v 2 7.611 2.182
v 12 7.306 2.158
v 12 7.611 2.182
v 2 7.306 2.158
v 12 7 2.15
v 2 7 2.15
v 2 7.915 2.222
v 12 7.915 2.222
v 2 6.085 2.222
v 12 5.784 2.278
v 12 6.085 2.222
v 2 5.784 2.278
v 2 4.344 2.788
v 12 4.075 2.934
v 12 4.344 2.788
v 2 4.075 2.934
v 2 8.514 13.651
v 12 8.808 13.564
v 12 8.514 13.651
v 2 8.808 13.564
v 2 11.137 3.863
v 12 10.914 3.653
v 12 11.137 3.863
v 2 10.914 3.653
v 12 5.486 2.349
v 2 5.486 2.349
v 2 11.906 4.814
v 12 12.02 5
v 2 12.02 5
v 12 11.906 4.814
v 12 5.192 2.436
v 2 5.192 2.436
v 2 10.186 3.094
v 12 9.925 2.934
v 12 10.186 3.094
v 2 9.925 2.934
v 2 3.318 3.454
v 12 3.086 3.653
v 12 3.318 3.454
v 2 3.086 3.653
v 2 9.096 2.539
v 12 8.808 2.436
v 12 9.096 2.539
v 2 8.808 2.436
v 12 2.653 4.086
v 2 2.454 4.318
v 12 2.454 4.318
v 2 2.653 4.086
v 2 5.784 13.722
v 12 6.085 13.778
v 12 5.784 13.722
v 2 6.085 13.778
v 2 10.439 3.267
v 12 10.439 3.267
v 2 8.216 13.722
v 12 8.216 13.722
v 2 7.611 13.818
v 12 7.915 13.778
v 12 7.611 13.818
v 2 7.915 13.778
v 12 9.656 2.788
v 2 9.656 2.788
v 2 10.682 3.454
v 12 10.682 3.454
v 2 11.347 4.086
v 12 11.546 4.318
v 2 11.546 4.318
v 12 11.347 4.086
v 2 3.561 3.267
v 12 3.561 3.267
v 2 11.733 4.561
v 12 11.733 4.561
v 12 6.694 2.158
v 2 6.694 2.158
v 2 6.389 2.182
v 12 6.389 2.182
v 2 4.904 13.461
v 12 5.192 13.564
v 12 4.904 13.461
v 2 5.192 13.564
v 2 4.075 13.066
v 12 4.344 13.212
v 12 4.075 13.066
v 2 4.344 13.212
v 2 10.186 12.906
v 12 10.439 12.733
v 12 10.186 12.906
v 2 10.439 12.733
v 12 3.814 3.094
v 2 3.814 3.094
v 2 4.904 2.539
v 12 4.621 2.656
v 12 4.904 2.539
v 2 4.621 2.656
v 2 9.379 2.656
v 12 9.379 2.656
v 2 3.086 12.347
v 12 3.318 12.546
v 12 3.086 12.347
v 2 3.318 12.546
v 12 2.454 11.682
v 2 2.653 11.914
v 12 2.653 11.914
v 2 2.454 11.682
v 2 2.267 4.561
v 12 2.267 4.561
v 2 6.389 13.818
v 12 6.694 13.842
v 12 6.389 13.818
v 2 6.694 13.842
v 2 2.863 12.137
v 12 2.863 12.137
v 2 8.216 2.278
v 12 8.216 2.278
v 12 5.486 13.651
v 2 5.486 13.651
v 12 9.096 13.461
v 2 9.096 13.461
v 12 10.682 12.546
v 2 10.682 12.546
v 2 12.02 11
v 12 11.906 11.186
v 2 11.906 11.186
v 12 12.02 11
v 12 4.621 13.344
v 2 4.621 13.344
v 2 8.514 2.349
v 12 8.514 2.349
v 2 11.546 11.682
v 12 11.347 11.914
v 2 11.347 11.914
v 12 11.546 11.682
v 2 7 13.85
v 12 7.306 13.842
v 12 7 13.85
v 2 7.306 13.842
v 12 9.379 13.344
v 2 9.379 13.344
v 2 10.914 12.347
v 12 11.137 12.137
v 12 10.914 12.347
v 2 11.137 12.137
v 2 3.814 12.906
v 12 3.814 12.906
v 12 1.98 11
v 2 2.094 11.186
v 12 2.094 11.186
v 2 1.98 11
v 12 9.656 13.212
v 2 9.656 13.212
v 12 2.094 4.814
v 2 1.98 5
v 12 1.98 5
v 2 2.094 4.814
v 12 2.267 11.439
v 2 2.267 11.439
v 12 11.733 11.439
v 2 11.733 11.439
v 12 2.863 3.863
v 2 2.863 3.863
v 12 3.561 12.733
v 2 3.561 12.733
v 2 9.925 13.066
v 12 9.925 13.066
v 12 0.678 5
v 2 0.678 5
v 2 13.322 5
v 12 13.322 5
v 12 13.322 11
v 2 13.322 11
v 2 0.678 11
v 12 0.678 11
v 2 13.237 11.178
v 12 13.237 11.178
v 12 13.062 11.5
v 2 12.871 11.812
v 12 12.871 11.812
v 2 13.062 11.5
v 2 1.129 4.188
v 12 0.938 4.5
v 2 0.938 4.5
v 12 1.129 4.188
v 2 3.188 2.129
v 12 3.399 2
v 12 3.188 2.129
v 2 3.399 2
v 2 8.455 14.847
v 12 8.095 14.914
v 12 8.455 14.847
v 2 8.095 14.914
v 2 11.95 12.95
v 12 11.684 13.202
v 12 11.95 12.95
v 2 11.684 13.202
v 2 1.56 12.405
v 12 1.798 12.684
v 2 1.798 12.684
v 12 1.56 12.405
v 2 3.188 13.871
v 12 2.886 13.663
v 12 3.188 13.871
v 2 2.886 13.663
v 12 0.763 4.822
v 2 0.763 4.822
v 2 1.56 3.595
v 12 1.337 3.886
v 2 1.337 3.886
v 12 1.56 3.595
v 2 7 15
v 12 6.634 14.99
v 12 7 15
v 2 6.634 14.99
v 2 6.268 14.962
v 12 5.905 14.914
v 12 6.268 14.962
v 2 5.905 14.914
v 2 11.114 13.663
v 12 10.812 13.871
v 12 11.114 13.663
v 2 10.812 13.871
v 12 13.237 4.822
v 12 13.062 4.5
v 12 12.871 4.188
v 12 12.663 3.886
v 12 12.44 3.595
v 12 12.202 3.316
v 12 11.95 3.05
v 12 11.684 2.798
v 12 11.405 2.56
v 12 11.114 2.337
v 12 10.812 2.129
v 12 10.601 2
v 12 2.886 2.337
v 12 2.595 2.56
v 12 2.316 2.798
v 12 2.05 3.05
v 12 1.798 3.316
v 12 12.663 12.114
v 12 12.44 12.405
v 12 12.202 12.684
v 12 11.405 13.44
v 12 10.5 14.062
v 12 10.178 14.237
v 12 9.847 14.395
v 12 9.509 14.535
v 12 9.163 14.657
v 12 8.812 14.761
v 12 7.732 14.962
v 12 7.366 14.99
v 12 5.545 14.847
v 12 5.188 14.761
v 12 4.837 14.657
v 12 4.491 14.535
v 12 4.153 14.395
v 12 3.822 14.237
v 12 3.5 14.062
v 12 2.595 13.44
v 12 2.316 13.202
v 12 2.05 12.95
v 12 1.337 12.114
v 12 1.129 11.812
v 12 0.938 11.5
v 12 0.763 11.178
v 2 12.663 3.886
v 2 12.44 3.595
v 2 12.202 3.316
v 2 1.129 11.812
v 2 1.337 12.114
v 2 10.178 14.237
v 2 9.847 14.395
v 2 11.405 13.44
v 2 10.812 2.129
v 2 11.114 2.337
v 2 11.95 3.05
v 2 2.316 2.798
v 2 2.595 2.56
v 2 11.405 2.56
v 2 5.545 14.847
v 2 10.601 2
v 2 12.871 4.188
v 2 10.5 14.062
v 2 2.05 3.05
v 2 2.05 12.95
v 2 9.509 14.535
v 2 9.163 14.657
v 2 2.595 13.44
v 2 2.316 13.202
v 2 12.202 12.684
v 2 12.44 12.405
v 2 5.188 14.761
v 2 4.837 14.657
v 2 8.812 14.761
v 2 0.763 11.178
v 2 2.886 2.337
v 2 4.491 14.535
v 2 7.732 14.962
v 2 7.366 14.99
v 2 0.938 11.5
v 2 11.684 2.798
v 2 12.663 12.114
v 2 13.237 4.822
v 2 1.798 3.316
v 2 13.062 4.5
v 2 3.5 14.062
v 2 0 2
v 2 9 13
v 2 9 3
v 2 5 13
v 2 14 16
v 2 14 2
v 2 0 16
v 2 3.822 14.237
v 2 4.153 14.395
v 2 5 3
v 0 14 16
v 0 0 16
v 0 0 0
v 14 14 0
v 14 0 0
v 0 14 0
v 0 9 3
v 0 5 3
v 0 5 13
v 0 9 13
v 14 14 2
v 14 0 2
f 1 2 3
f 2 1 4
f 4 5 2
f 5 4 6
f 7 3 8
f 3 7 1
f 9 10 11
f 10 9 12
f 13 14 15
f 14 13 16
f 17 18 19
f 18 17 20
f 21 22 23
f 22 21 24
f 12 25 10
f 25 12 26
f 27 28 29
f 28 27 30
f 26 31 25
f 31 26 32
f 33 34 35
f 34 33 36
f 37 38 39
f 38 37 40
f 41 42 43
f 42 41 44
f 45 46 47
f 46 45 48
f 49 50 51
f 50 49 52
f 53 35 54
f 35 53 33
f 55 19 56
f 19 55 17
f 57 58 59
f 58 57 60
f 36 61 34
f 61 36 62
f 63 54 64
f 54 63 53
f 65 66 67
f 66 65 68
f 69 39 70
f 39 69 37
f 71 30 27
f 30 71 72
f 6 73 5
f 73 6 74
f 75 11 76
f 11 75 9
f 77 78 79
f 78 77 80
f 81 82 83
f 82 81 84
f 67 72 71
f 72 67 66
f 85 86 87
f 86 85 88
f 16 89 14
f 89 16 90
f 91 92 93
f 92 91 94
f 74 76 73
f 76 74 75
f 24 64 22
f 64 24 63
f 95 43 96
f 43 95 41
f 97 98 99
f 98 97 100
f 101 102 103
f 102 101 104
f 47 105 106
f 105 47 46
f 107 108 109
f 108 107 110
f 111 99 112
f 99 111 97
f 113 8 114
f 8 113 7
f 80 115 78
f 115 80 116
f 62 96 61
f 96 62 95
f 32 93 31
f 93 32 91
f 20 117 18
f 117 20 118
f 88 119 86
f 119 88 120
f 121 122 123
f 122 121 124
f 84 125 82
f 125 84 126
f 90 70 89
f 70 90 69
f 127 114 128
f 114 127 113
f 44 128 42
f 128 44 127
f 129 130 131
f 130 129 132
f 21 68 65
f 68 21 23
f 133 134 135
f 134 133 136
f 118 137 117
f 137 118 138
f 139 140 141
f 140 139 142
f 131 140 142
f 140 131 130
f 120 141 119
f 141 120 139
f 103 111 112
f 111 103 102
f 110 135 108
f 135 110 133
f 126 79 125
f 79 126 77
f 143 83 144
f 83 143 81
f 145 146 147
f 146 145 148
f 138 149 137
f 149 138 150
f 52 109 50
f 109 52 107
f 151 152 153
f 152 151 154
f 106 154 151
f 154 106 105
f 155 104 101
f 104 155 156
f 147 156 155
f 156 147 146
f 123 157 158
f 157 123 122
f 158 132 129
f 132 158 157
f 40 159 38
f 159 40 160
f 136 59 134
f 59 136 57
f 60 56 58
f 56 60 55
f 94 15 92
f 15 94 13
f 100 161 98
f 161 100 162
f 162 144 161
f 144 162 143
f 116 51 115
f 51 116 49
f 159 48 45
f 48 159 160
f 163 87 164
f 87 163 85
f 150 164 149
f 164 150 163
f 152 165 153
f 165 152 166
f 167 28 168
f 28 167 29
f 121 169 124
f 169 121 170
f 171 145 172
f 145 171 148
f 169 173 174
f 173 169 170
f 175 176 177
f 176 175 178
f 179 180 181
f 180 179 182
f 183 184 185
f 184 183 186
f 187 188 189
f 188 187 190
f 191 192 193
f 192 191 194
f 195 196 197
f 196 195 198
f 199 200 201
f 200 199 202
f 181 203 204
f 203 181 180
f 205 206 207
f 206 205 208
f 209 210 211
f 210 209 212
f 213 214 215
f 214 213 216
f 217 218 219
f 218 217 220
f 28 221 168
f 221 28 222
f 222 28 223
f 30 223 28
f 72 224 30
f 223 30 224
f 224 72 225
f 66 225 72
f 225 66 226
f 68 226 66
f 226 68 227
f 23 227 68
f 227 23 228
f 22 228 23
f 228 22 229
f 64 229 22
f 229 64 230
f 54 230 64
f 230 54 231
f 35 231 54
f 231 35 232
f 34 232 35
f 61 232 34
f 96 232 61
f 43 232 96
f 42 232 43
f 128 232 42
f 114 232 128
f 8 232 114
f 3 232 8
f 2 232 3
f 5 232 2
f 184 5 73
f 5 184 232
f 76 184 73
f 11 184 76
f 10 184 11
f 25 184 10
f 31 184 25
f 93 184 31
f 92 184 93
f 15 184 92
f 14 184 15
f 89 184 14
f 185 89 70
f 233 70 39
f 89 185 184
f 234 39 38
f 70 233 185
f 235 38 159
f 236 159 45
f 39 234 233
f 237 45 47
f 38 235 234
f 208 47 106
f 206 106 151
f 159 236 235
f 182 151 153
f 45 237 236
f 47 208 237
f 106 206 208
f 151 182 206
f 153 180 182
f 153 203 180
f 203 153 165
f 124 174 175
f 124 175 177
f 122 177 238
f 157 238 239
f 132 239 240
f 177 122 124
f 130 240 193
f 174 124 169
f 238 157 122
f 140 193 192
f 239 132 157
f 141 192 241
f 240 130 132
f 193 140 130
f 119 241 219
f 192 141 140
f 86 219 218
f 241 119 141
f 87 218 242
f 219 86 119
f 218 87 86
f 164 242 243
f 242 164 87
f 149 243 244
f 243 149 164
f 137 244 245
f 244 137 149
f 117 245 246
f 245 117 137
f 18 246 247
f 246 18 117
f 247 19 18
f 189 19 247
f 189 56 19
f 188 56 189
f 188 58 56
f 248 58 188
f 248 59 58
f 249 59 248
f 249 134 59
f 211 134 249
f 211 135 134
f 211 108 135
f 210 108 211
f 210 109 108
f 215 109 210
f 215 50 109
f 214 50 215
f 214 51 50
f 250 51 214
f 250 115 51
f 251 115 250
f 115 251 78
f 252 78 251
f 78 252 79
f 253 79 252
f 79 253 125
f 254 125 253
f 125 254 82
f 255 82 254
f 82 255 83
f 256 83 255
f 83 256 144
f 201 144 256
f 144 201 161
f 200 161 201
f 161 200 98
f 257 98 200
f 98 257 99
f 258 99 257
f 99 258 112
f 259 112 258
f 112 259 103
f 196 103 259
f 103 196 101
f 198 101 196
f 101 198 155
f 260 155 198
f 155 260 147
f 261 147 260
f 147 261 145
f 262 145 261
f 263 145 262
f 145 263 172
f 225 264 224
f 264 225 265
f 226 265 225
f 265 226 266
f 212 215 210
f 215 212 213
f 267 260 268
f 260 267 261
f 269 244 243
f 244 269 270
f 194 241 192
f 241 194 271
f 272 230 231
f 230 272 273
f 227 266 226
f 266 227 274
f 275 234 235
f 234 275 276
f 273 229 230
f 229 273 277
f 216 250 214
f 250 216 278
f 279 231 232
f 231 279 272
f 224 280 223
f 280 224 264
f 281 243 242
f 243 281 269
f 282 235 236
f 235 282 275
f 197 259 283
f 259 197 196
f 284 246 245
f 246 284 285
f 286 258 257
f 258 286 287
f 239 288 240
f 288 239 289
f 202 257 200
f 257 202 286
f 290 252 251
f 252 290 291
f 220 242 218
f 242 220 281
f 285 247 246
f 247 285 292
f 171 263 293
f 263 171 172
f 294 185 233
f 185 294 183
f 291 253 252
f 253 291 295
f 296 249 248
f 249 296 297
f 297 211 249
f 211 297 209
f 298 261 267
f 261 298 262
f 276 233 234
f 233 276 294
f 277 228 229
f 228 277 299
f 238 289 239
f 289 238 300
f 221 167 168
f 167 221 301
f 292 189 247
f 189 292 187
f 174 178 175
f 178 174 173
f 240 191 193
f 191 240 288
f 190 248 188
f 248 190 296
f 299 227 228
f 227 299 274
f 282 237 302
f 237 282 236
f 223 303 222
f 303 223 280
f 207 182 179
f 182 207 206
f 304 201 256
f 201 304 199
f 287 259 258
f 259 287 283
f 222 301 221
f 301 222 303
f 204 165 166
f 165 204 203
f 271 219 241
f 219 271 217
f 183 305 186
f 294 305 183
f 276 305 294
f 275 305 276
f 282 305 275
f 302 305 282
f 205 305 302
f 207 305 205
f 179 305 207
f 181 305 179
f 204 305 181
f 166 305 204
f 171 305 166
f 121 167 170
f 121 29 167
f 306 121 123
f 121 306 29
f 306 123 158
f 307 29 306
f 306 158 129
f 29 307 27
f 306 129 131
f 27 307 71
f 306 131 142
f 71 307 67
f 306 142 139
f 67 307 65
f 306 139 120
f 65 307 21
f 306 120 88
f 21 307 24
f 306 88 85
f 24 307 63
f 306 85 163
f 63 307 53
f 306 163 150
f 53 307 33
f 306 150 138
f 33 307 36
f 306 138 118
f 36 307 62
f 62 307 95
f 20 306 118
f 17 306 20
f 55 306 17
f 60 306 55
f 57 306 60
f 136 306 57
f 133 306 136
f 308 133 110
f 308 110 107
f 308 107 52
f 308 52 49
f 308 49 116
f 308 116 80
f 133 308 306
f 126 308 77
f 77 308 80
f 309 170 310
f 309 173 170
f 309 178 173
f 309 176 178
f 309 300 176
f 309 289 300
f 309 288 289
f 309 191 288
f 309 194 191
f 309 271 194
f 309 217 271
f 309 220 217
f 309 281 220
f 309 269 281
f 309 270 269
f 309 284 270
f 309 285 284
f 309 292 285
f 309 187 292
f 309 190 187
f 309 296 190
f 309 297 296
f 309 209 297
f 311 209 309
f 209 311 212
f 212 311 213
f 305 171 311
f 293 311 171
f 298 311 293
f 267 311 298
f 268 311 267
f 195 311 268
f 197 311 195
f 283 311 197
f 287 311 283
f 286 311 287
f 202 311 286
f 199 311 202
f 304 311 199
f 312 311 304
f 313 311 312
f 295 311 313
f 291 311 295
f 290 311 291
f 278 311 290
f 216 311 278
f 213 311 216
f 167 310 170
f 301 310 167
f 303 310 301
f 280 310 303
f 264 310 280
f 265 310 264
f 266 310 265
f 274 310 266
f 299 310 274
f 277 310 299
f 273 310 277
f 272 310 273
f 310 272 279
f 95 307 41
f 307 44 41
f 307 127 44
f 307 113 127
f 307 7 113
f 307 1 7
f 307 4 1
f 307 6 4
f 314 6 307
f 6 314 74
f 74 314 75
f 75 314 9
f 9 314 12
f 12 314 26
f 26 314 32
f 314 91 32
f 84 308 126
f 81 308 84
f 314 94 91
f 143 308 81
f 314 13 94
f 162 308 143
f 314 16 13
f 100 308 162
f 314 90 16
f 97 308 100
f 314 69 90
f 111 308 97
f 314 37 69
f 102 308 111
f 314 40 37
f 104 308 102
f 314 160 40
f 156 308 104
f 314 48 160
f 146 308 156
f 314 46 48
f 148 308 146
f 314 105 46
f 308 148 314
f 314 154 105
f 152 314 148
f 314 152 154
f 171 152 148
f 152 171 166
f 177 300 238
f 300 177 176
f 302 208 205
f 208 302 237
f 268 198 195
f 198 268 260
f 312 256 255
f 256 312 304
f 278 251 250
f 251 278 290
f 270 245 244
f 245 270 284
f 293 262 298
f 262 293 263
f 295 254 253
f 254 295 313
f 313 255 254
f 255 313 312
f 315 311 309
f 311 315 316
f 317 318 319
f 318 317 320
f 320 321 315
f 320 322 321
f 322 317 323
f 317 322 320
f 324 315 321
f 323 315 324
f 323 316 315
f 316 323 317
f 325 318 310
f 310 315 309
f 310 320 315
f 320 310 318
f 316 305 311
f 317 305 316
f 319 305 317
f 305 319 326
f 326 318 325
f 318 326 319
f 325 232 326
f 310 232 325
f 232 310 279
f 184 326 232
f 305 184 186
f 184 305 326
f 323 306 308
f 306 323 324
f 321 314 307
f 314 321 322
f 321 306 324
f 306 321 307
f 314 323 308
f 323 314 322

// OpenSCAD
// piezobuzzermount.scad - A Mount for a piezo buzzer.
// 2022 - Gregory A Sanders
//
$fn=120;
module spkr(){
    difference(){
        cylinder(h=10, d=14);
        union(){
            translate([0,0,-1])
            cylinder(h=12, d=11.7);
            translate([-3,-8,-1])
            cube([6,16,16]);
        }
    }
}

module squareparts(){
    difference(){
        union(){
            cube([2,14,16]);
            cube([14,14,2]);
        }
        translate([-1,5,3])
        cube([4,4,10]);
    }
}

rotate([0,90,0])
translate([-8,7,2])
spkr();
squareparts();
